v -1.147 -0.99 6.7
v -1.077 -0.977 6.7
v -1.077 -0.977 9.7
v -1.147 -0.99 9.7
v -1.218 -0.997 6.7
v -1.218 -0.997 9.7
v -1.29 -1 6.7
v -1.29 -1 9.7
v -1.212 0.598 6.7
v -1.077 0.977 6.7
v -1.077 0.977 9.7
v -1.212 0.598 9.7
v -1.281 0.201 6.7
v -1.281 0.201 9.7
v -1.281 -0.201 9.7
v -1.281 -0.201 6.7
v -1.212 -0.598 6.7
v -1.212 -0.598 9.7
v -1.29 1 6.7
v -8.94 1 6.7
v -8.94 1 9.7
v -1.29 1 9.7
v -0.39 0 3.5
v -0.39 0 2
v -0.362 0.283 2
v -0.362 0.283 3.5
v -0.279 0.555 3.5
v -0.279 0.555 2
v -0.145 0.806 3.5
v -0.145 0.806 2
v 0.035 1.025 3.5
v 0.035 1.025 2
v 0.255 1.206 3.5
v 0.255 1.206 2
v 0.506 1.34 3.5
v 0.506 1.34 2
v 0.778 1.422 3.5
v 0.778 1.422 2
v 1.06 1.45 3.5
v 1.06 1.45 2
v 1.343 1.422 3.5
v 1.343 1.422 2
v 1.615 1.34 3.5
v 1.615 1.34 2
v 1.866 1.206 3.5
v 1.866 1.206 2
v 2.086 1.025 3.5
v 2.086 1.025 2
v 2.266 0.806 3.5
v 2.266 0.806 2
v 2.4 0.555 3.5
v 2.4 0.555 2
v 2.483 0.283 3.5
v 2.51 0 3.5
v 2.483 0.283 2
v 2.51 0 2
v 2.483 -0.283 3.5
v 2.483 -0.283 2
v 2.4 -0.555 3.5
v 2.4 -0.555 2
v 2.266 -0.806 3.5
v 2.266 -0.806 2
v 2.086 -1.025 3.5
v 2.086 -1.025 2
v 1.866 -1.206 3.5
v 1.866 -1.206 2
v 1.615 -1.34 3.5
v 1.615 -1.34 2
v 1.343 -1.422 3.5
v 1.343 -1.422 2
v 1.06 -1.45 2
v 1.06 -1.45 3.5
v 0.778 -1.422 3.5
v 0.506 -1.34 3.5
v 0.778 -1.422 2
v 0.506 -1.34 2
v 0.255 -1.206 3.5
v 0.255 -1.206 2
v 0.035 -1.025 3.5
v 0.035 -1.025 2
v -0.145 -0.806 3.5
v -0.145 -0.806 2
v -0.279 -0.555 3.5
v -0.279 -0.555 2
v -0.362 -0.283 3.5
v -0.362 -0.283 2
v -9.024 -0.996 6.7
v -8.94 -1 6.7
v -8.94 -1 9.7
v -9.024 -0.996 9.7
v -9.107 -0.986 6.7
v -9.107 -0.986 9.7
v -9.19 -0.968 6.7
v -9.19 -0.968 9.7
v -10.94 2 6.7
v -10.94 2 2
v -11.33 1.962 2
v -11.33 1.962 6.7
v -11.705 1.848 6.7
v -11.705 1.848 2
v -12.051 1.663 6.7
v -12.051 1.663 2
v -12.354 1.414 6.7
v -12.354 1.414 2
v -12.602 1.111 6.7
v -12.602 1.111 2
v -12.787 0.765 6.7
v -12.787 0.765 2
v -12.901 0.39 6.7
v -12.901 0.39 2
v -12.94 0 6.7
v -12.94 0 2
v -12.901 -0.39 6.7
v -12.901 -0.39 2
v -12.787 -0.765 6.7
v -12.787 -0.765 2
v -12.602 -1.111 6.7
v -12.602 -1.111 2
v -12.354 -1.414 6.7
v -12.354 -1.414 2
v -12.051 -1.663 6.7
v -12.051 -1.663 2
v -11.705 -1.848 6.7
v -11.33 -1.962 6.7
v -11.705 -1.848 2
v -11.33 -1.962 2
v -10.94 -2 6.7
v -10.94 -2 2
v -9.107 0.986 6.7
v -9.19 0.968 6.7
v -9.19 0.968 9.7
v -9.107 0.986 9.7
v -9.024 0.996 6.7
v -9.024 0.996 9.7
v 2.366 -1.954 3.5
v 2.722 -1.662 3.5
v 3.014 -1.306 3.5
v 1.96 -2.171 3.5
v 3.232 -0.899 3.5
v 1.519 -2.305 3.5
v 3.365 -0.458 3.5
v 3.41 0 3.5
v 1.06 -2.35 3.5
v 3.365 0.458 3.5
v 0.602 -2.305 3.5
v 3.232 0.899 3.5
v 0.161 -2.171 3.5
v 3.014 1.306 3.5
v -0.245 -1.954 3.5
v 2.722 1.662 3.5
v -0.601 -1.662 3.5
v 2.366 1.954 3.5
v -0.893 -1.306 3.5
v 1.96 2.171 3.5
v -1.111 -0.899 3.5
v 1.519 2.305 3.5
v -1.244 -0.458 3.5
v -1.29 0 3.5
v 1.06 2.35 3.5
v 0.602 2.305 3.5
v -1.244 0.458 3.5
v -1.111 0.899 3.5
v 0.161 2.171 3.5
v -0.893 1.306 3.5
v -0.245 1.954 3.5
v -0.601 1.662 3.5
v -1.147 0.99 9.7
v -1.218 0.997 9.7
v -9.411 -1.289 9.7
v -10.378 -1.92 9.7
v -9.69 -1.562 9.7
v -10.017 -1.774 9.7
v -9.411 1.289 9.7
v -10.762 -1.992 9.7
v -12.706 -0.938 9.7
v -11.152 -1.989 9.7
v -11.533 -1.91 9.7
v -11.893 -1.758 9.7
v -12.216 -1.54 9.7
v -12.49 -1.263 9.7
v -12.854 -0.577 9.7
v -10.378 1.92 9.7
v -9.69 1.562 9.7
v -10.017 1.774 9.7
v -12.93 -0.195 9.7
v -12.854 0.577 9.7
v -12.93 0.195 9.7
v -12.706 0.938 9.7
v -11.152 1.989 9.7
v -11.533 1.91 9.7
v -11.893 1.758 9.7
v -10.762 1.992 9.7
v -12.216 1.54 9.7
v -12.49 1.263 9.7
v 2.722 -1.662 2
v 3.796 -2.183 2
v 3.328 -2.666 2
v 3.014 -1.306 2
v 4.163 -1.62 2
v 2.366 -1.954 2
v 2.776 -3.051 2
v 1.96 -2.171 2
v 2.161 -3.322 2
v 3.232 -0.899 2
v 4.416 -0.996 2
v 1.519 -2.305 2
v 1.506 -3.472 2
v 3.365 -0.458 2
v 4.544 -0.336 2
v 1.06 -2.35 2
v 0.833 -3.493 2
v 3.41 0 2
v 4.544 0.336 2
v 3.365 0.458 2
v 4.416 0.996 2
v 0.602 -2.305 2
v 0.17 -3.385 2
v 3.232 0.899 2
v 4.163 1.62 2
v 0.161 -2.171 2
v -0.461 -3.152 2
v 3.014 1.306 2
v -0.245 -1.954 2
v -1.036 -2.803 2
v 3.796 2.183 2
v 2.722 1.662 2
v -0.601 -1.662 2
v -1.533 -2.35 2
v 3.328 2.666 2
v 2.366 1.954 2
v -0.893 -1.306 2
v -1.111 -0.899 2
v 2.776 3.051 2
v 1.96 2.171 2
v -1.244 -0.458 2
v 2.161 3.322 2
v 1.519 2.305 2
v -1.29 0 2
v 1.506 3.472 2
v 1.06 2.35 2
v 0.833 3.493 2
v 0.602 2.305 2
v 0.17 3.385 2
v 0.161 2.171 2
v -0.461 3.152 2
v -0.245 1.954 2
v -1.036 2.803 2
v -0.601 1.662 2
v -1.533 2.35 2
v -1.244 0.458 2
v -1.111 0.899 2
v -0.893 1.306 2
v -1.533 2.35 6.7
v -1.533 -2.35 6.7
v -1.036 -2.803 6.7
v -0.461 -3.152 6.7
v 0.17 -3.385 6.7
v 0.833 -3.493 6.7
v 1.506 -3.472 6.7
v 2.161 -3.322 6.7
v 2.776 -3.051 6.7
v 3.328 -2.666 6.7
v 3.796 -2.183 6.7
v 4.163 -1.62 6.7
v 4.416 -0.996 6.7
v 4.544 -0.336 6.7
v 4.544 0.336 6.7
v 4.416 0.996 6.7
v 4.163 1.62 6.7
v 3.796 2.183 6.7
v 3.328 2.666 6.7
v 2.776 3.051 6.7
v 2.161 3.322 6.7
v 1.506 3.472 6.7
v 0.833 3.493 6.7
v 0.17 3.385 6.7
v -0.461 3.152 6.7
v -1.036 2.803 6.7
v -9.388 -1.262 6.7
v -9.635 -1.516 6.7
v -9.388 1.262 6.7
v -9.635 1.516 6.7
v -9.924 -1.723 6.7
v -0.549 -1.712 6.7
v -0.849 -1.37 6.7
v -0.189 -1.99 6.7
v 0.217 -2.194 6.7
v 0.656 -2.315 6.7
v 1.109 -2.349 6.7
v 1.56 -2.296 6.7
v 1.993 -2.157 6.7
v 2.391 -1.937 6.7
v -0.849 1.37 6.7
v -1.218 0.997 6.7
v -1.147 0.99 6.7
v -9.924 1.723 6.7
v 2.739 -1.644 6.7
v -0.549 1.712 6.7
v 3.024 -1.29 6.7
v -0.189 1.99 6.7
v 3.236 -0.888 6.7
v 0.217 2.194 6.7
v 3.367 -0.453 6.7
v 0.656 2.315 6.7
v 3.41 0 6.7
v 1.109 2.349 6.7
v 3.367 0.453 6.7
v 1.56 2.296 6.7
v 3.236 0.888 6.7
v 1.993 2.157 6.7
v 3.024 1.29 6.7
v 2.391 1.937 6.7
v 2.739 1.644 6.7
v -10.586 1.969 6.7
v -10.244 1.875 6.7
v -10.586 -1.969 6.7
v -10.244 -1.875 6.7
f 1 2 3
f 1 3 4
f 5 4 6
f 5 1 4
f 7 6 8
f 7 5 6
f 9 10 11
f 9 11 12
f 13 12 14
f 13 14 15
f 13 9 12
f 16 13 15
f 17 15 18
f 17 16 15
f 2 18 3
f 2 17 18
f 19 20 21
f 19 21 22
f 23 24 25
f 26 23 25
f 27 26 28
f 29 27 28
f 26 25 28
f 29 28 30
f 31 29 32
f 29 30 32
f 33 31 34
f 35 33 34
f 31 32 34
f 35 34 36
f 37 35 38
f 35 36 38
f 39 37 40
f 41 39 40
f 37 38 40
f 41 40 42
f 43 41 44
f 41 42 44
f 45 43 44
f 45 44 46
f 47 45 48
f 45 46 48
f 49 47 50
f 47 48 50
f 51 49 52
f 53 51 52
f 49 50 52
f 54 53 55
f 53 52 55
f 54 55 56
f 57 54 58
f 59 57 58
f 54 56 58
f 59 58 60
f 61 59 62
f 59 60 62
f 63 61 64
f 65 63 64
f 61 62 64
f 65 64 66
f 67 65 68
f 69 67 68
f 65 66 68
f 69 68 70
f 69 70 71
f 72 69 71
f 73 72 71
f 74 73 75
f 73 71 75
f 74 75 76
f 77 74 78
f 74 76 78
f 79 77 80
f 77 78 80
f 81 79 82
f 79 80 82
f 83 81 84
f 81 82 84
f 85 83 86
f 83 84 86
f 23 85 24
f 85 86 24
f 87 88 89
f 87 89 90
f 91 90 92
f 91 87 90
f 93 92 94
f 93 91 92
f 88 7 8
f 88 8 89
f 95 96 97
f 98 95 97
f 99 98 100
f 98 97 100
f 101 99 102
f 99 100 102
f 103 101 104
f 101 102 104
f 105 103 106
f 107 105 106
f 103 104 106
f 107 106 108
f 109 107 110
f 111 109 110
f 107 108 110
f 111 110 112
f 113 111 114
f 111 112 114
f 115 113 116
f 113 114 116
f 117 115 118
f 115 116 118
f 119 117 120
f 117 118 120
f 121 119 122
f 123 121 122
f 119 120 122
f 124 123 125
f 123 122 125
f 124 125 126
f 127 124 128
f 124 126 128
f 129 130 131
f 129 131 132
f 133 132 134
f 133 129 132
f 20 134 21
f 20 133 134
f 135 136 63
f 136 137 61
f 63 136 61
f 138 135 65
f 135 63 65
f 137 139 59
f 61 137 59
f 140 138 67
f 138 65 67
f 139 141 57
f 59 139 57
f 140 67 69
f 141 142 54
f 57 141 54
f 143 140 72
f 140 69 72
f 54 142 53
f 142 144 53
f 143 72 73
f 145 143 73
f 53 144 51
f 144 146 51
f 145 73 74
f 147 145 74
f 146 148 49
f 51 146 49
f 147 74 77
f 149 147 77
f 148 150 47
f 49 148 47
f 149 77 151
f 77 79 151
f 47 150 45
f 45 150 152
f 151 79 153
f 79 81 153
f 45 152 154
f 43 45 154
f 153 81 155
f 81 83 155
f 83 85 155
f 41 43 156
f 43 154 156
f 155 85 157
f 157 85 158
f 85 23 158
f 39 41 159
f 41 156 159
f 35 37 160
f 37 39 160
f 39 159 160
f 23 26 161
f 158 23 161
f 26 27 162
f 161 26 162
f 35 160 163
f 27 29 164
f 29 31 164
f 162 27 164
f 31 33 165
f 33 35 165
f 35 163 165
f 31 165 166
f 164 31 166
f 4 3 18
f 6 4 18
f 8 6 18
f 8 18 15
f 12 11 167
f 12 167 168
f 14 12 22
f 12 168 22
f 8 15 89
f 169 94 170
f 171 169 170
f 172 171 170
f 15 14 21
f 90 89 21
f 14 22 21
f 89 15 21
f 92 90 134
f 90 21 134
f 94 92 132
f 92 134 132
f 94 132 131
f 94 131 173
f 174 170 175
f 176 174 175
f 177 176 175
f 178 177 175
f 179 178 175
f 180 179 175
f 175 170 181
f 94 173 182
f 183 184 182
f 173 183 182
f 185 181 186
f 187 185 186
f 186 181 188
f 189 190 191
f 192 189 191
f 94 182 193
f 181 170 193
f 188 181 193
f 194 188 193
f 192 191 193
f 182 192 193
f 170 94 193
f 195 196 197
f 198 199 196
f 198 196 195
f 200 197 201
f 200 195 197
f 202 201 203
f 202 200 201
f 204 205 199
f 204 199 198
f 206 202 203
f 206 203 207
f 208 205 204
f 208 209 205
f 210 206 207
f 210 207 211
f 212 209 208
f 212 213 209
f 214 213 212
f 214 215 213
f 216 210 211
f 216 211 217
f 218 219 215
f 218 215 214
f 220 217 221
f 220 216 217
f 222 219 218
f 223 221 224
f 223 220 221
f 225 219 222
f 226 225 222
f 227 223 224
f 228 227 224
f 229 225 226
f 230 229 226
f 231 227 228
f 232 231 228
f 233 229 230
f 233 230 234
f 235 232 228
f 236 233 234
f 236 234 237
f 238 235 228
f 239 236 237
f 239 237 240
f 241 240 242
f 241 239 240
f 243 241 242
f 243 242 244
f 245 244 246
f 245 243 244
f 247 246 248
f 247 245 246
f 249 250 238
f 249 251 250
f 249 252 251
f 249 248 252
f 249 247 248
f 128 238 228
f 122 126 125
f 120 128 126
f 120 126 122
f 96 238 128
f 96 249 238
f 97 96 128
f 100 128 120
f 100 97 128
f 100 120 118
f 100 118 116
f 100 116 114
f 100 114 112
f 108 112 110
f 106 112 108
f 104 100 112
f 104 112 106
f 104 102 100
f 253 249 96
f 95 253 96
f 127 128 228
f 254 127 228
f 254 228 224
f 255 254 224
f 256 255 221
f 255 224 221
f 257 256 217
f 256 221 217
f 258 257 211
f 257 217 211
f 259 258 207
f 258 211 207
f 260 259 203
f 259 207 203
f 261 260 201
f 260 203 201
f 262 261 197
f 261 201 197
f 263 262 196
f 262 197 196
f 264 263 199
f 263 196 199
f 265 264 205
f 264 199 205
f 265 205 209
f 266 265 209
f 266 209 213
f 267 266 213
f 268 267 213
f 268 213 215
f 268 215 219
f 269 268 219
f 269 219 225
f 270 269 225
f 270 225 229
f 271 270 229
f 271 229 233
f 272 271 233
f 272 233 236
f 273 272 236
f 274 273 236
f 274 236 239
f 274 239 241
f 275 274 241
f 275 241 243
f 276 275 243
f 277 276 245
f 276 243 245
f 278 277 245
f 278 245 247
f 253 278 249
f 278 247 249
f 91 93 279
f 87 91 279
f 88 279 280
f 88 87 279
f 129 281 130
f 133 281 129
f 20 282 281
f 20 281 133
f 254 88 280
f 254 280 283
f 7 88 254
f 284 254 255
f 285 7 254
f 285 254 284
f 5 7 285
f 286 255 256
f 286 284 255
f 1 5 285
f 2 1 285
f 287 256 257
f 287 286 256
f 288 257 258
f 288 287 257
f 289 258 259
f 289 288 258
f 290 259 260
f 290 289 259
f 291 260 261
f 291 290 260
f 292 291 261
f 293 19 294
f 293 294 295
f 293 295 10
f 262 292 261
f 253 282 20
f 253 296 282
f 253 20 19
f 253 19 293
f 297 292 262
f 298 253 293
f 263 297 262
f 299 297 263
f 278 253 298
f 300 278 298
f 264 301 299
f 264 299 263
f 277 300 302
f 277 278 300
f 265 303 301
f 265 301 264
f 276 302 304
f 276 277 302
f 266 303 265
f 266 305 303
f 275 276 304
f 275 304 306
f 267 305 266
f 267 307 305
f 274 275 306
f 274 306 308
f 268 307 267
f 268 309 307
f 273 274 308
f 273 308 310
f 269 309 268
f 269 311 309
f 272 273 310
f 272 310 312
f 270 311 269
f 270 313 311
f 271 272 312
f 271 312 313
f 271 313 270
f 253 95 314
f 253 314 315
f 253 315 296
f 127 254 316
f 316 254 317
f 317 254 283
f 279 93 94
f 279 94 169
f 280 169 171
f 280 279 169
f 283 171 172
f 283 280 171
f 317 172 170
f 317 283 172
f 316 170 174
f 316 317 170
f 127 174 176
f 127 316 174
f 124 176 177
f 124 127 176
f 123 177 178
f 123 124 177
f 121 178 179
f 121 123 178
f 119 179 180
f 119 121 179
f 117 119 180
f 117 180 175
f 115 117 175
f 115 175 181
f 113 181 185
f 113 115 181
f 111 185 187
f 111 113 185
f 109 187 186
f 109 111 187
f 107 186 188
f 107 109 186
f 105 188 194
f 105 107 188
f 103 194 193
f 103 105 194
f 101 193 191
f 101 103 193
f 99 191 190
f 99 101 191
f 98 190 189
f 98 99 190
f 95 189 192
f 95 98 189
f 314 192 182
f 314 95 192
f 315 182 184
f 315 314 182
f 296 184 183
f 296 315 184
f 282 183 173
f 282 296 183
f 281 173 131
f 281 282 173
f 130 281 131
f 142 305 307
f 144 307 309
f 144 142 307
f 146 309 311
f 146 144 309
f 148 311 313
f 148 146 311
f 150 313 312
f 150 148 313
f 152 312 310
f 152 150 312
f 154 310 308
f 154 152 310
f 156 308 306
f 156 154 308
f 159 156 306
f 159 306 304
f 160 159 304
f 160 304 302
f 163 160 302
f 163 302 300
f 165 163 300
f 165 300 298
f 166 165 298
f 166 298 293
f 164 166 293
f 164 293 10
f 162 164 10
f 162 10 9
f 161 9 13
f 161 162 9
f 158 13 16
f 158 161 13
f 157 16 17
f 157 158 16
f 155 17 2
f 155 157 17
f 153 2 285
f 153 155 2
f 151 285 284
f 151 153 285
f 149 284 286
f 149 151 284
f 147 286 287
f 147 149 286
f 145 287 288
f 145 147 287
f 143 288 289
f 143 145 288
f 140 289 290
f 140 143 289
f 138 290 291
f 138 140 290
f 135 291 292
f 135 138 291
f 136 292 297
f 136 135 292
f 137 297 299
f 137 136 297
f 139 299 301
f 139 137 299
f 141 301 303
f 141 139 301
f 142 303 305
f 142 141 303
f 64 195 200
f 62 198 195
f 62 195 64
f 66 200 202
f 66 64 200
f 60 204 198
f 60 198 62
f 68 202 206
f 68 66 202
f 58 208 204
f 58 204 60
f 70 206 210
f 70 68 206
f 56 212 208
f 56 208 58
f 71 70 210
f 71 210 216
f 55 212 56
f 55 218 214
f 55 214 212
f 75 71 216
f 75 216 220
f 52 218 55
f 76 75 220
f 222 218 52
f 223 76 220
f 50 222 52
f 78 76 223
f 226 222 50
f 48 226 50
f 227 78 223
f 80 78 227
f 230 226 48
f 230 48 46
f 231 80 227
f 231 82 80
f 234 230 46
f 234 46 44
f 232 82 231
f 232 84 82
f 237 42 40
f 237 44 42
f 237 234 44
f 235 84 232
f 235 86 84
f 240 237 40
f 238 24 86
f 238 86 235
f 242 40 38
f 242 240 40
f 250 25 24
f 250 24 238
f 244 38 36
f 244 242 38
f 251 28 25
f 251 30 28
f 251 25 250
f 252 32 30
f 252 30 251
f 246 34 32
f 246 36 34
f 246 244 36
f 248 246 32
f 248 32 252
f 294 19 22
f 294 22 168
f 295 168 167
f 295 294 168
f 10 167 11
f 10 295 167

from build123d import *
from build123d.topology import SkipClean

# Parameters (mm, degrees)
SKETCH1_R           = 2.35
BOSS_EXTRUDE1_DEPTH = 6.7
BOSS_EXTRUDE2_DEPTH = 3
CUT_EXTRUDE1_DEPTH  = 2
SKETCH4_R           = 2.35
SKETCH4_R_2         = 1.45
BOSS_EXTRUDE3_DEPTH = 1.5


with BuildPart() as part:
    # Sketch1 → Boss-Extrude1 (new body)
    with BuildSketch(Plane.XY):
        with BuildLine():
            Line((-1.533260445, 2.35), (-10.939517975, 2))
            ThreePointArc((-10.939517975, 2), (-12.939517975, 0), (-10.939517975, -2))
            Line((-10.939517975, -2), (-1.533260445, -2.35))
            ThreePointArc((-1.533260445, -2.35), (4.560482025, 0), (-1.533260445, 2.35))
        make_face()
        with Locations((1.060482025, 0)):
            Circle(SKETCH1_R, mode=Mode.SUBTRACT)
    extrude(amount=BOSS_EXTRUDE1_DEPTH)

    # Sketch2 → Boss-Extrude2 (add)
    with SkipClean():  # the faces are left unmerged after this step: merging them gives an invalid solid
        with BuildSketch(Plane.XY.offset(6.7)):
            with BuildLine():
                Line((-8.939517975, 1), (-1.289517975, 1))
                ThreePointArc((-1.289517975, 1), (-1.18252076, 0.99425932), (-1.076752018, 0.977103192))
                ThreePointArc((-1.076752018, 0.977103192), (-1.289517975, 0), (-1.076752018, -0.977103192))
                ThreePointArc((-1.076752018, -0.977103192), (-1.18252076, -0.99425932), (-1.289517975, -1))
                Line((-1.289517975, -1), (-8.939517975, -1))
                ThreePointArc((-8.939517975, -1), (-9.065522268, -0.992029696), (-9.189517975, -0.968245837))
                ThreePointArc((-9.189517975, -0.968245837), (-12.939517975, 0), (-9.189517975, 0.968245837))
                ThreePointArc((-9.189517975, 0.968245837), (-9.065522268, 0.992029696), (-8.939517975, 1))
            make_face()
        extrude(amount=BOSS_EXTRUDE2_DEPTH)

    # Sketch3 → Cut-Extrude1 (cut)
    with SkipClean():  # the faces are left unmerged after this step: merging them gives an invalid solid
        with BuildSketch(Plane(origin=(0, 0, 0), x_dir=(-1, 0, 0), z_dir=(0, 0, -1))):
            with BuildLine():
                Line((10.939517975, 2), (1.533260445, 2.35))
                ThreePointArc((1.533260445, 2.35), (-4.560482025, 0), (1.533260445, -2.35))
                Line((1.533260445, -2.35), (10.939517975, -2))
                ThreePointArc((10.939517975, -2), (12.939517975, 0), (10.939517975, 2))
            make_face()
        extrude(amount=-CUT_EXTRUDE1_DEPTH, mode=Mode.SUBTRACT)

    # Sketch4 → Boss-Extrude3 (add)
    with SkipClean():  # the faces are left unmerged after this step: merging them gives an invalid solid
        with BuildSketch(Plane(origin=(0, 0, 2), x_dir=(-1, 0, 0), z_dir=(0, 0, -1))):
            with Locations((-1.060482025, 0)):
                Circle(SKETCH4_R)
            with Locations((-1.060482025, 0)):
                Circle(SKETCH4_R_2, mode=Mode.SUBTRACT)
        extrude(amount=-BOSS_EXTRUDE3_DEPTH)


solid = part.part
